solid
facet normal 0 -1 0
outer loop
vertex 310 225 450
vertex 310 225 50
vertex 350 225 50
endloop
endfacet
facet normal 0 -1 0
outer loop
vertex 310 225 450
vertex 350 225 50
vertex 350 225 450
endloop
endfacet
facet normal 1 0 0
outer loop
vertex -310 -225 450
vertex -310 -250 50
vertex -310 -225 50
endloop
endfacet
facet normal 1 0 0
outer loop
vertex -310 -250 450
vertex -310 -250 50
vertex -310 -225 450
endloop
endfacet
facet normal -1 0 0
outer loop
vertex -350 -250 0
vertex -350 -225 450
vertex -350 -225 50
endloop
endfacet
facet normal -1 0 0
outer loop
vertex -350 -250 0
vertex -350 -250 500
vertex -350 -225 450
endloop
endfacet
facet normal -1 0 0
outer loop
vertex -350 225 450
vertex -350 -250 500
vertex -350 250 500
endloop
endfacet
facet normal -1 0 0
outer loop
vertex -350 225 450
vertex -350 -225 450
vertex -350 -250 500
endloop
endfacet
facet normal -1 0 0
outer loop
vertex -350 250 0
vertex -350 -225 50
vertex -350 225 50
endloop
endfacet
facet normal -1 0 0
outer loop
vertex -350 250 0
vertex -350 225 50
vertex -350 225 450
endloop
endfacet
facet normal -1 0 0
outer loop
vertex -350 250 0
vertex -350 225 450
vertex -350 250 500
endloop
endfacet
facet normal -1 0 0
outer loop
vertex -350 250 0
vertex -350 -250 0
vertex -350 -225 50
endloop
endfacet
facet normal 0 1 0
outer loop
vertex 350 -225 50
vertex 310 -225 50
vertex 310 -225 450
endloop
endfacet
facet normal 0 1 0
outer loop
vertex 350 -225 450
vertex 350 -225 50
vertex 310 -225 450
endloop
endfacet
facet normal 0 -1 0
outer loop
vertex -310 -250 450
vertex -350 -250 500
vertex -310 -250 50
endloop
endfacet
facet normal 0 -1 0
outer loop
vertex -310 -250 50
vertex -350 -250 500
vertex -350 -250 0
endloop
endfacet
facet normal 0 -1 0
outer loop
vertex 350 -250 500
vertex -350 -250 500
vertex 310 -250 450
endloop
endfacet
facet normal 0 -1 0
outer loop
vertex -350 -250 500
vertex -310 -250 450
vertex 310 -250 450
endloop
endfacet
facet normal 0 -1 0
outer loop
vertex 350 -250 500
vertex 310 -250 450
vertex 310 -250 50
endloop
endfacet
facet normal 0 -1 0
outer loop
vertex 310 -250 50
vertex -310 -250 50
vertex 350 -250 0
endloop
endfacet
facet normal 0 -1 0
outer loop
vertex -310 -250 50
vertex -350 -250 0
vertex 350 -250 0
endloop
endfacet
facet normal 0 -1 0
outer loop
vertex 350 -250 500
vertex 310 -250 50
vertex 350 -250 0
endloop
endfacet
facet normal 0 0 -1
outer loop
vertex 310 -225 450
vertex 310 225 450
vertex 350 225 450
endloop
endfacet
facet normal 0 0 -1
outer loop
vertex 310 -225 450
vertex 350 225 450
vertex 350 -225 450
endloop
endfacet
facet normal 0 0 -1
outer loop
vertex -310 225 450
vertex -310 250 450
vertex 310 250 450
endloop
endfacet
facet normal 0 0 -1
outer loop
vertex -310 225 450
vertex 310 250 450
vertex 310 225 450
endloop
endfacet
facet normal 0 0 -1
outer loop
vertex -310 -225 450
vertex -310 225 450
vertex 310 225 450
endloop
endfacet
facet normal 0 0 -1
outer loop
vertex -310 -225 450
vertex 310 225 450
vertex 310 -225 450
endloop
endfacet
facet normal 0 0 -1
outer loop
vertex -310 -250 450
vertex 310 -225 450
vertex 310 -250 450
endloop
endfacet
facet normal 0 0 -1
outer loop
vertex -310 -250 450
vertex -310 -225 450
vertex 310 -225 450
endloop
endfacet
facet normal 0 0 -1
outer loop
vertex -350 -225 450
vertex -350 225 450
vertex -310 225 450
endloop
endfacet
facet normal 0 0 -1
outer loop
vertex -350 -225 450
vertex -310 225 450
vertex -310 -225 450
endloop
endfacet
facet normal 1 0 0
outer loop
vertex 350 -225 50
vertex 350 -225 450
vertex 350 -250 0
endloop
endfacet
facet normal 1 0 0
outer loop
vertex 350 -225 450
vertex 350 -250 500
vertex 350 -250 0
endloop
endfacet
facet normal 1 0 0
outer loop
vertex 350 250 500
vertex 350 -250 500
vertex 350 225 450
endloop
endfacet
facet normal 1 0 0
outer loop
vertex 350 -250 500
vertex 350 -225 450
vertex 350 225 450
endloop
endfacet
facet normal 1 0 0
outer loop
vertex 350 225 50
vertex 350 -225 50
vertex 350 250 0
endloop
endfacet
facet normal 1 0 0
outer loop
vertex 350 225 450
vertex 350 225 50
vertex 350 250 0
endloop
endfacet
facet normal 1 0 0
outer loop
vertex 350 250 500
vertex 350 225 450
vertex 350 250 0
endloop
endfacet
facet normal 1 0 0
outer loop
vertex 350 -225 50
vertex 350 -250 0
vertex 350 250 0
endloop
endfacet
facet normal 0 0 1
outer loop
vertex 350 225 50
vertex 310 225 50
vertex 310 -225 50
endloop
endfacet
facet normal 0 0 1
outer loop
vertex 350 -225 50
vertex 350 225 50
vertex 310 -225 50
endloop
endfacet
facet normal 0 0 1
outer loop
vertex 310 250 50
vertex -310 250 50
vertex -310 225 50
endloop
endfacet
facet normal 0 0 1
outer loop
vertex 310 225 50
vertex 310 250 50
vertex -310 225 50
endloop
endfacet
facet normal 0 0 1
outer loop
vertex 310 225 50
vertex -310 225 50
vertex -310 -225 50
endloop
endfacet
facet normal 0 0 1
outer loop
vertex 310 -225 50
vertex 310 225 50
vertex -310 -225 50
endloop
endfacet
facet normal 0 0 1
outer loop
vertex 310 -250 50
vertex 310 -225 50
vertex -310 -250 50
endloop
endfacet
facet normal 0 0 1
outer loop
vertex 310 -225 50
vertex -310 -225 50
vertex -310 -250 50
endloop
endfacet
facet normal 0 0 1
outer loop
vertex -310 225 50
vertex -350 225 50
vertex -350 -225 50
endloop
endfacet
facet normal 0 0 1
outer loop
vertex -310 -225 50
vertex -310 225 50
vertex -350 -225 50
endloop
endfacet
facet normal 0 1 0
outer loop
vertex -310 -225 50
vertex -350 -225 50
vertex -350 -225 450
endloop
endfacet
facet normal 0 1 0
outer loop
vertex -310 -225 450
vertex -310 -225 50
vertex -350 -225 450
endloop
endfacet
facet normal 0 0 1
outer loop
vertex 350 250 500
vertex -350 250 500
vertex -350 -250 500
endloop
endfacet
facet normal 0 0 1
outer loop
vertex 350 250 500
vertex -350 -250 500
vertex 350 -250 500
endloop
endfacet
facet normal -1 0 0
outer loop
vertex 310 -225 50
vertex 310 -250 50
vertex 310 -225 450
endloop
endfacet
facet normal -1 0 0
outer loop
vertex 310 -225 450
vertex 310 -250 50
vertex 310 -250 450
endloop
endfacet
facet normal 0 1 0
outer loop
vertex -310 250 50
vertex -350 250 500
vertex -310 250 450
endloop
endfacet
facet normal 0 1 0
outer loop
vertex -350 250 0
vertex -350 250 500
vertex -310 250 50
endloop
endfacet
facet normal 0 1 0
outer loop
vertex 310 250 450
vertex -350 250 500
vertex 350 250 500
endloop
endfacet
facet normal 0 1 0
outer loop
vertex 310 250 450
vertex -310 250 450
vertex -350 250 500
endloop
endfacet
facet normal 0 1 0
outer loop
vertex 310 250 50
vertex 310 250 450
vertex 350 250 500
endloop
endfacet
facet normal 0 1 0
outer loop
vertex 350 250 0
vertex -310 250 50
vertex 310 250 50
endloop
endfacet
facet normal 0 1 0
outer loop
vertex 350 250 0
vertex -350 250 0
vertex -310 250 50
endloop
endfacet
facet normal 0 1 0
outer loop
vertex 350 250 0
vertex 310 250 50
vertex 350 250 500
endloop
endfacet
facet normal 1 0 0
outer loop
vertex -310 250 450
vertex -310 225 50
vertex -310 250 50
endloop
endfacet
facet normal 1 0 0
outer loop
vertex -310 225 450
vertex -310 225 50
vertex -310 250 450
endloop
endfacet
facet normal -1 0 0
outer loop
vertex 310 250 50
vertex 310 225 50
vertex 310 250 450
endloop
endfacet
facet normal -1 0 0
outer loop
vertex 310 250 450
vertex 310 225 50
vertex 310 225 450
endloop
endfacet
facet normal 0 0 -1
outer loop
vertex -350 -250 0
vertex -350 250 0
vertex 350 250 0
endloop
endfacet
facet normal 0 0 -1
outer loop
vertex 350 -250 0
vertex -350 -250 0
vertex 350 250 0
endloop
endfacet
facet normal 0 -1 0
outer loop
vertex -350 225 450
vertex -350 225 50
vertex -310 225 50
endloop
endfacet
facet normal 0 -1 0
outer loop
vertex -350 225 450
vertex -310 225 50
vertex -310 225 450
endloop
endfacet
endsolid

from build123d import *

# Parameters (mm, degrees)
F0_W     = 700
F0_H     = 500
F1_DEPTH = 500
F2_W     = 620
F2_H     = 400
F3_DEPTH = 810
F4_W     = 450
F4_H     = 400
F5_DEPTH = 777


with BuildPart() as f1:
    # F0 (on Top) → F1 (new body)
    with BuildSketch(Plane.XY):
        Rectangle(F0_W, F0_H)
    extrude(amount=F1_DEPTH)

    # F2 (on face) → F3 (cut)
    with BuildSketch(Plane.XZ.offset(250)):
        with Locations((0, 250)):
            Rectangle(F2_W, F2_H)
    extrude(amount=-F3_DEPTH, mode=Mode.SUBTRACT)

    # F4 (on face) → F5 (cut)
    with BuildSketch(Plane(origin=(-350, 0, 0), x_dir=(0, -1, 0), z_dir=(-1, 0, 0))):
        with Locations((0, 250)):
            Rectangle(F4_W, F4_H)
    extrude(amount=-F5_DEPTH, mode=Mode.SUBTRACT)


solid = f1.part
